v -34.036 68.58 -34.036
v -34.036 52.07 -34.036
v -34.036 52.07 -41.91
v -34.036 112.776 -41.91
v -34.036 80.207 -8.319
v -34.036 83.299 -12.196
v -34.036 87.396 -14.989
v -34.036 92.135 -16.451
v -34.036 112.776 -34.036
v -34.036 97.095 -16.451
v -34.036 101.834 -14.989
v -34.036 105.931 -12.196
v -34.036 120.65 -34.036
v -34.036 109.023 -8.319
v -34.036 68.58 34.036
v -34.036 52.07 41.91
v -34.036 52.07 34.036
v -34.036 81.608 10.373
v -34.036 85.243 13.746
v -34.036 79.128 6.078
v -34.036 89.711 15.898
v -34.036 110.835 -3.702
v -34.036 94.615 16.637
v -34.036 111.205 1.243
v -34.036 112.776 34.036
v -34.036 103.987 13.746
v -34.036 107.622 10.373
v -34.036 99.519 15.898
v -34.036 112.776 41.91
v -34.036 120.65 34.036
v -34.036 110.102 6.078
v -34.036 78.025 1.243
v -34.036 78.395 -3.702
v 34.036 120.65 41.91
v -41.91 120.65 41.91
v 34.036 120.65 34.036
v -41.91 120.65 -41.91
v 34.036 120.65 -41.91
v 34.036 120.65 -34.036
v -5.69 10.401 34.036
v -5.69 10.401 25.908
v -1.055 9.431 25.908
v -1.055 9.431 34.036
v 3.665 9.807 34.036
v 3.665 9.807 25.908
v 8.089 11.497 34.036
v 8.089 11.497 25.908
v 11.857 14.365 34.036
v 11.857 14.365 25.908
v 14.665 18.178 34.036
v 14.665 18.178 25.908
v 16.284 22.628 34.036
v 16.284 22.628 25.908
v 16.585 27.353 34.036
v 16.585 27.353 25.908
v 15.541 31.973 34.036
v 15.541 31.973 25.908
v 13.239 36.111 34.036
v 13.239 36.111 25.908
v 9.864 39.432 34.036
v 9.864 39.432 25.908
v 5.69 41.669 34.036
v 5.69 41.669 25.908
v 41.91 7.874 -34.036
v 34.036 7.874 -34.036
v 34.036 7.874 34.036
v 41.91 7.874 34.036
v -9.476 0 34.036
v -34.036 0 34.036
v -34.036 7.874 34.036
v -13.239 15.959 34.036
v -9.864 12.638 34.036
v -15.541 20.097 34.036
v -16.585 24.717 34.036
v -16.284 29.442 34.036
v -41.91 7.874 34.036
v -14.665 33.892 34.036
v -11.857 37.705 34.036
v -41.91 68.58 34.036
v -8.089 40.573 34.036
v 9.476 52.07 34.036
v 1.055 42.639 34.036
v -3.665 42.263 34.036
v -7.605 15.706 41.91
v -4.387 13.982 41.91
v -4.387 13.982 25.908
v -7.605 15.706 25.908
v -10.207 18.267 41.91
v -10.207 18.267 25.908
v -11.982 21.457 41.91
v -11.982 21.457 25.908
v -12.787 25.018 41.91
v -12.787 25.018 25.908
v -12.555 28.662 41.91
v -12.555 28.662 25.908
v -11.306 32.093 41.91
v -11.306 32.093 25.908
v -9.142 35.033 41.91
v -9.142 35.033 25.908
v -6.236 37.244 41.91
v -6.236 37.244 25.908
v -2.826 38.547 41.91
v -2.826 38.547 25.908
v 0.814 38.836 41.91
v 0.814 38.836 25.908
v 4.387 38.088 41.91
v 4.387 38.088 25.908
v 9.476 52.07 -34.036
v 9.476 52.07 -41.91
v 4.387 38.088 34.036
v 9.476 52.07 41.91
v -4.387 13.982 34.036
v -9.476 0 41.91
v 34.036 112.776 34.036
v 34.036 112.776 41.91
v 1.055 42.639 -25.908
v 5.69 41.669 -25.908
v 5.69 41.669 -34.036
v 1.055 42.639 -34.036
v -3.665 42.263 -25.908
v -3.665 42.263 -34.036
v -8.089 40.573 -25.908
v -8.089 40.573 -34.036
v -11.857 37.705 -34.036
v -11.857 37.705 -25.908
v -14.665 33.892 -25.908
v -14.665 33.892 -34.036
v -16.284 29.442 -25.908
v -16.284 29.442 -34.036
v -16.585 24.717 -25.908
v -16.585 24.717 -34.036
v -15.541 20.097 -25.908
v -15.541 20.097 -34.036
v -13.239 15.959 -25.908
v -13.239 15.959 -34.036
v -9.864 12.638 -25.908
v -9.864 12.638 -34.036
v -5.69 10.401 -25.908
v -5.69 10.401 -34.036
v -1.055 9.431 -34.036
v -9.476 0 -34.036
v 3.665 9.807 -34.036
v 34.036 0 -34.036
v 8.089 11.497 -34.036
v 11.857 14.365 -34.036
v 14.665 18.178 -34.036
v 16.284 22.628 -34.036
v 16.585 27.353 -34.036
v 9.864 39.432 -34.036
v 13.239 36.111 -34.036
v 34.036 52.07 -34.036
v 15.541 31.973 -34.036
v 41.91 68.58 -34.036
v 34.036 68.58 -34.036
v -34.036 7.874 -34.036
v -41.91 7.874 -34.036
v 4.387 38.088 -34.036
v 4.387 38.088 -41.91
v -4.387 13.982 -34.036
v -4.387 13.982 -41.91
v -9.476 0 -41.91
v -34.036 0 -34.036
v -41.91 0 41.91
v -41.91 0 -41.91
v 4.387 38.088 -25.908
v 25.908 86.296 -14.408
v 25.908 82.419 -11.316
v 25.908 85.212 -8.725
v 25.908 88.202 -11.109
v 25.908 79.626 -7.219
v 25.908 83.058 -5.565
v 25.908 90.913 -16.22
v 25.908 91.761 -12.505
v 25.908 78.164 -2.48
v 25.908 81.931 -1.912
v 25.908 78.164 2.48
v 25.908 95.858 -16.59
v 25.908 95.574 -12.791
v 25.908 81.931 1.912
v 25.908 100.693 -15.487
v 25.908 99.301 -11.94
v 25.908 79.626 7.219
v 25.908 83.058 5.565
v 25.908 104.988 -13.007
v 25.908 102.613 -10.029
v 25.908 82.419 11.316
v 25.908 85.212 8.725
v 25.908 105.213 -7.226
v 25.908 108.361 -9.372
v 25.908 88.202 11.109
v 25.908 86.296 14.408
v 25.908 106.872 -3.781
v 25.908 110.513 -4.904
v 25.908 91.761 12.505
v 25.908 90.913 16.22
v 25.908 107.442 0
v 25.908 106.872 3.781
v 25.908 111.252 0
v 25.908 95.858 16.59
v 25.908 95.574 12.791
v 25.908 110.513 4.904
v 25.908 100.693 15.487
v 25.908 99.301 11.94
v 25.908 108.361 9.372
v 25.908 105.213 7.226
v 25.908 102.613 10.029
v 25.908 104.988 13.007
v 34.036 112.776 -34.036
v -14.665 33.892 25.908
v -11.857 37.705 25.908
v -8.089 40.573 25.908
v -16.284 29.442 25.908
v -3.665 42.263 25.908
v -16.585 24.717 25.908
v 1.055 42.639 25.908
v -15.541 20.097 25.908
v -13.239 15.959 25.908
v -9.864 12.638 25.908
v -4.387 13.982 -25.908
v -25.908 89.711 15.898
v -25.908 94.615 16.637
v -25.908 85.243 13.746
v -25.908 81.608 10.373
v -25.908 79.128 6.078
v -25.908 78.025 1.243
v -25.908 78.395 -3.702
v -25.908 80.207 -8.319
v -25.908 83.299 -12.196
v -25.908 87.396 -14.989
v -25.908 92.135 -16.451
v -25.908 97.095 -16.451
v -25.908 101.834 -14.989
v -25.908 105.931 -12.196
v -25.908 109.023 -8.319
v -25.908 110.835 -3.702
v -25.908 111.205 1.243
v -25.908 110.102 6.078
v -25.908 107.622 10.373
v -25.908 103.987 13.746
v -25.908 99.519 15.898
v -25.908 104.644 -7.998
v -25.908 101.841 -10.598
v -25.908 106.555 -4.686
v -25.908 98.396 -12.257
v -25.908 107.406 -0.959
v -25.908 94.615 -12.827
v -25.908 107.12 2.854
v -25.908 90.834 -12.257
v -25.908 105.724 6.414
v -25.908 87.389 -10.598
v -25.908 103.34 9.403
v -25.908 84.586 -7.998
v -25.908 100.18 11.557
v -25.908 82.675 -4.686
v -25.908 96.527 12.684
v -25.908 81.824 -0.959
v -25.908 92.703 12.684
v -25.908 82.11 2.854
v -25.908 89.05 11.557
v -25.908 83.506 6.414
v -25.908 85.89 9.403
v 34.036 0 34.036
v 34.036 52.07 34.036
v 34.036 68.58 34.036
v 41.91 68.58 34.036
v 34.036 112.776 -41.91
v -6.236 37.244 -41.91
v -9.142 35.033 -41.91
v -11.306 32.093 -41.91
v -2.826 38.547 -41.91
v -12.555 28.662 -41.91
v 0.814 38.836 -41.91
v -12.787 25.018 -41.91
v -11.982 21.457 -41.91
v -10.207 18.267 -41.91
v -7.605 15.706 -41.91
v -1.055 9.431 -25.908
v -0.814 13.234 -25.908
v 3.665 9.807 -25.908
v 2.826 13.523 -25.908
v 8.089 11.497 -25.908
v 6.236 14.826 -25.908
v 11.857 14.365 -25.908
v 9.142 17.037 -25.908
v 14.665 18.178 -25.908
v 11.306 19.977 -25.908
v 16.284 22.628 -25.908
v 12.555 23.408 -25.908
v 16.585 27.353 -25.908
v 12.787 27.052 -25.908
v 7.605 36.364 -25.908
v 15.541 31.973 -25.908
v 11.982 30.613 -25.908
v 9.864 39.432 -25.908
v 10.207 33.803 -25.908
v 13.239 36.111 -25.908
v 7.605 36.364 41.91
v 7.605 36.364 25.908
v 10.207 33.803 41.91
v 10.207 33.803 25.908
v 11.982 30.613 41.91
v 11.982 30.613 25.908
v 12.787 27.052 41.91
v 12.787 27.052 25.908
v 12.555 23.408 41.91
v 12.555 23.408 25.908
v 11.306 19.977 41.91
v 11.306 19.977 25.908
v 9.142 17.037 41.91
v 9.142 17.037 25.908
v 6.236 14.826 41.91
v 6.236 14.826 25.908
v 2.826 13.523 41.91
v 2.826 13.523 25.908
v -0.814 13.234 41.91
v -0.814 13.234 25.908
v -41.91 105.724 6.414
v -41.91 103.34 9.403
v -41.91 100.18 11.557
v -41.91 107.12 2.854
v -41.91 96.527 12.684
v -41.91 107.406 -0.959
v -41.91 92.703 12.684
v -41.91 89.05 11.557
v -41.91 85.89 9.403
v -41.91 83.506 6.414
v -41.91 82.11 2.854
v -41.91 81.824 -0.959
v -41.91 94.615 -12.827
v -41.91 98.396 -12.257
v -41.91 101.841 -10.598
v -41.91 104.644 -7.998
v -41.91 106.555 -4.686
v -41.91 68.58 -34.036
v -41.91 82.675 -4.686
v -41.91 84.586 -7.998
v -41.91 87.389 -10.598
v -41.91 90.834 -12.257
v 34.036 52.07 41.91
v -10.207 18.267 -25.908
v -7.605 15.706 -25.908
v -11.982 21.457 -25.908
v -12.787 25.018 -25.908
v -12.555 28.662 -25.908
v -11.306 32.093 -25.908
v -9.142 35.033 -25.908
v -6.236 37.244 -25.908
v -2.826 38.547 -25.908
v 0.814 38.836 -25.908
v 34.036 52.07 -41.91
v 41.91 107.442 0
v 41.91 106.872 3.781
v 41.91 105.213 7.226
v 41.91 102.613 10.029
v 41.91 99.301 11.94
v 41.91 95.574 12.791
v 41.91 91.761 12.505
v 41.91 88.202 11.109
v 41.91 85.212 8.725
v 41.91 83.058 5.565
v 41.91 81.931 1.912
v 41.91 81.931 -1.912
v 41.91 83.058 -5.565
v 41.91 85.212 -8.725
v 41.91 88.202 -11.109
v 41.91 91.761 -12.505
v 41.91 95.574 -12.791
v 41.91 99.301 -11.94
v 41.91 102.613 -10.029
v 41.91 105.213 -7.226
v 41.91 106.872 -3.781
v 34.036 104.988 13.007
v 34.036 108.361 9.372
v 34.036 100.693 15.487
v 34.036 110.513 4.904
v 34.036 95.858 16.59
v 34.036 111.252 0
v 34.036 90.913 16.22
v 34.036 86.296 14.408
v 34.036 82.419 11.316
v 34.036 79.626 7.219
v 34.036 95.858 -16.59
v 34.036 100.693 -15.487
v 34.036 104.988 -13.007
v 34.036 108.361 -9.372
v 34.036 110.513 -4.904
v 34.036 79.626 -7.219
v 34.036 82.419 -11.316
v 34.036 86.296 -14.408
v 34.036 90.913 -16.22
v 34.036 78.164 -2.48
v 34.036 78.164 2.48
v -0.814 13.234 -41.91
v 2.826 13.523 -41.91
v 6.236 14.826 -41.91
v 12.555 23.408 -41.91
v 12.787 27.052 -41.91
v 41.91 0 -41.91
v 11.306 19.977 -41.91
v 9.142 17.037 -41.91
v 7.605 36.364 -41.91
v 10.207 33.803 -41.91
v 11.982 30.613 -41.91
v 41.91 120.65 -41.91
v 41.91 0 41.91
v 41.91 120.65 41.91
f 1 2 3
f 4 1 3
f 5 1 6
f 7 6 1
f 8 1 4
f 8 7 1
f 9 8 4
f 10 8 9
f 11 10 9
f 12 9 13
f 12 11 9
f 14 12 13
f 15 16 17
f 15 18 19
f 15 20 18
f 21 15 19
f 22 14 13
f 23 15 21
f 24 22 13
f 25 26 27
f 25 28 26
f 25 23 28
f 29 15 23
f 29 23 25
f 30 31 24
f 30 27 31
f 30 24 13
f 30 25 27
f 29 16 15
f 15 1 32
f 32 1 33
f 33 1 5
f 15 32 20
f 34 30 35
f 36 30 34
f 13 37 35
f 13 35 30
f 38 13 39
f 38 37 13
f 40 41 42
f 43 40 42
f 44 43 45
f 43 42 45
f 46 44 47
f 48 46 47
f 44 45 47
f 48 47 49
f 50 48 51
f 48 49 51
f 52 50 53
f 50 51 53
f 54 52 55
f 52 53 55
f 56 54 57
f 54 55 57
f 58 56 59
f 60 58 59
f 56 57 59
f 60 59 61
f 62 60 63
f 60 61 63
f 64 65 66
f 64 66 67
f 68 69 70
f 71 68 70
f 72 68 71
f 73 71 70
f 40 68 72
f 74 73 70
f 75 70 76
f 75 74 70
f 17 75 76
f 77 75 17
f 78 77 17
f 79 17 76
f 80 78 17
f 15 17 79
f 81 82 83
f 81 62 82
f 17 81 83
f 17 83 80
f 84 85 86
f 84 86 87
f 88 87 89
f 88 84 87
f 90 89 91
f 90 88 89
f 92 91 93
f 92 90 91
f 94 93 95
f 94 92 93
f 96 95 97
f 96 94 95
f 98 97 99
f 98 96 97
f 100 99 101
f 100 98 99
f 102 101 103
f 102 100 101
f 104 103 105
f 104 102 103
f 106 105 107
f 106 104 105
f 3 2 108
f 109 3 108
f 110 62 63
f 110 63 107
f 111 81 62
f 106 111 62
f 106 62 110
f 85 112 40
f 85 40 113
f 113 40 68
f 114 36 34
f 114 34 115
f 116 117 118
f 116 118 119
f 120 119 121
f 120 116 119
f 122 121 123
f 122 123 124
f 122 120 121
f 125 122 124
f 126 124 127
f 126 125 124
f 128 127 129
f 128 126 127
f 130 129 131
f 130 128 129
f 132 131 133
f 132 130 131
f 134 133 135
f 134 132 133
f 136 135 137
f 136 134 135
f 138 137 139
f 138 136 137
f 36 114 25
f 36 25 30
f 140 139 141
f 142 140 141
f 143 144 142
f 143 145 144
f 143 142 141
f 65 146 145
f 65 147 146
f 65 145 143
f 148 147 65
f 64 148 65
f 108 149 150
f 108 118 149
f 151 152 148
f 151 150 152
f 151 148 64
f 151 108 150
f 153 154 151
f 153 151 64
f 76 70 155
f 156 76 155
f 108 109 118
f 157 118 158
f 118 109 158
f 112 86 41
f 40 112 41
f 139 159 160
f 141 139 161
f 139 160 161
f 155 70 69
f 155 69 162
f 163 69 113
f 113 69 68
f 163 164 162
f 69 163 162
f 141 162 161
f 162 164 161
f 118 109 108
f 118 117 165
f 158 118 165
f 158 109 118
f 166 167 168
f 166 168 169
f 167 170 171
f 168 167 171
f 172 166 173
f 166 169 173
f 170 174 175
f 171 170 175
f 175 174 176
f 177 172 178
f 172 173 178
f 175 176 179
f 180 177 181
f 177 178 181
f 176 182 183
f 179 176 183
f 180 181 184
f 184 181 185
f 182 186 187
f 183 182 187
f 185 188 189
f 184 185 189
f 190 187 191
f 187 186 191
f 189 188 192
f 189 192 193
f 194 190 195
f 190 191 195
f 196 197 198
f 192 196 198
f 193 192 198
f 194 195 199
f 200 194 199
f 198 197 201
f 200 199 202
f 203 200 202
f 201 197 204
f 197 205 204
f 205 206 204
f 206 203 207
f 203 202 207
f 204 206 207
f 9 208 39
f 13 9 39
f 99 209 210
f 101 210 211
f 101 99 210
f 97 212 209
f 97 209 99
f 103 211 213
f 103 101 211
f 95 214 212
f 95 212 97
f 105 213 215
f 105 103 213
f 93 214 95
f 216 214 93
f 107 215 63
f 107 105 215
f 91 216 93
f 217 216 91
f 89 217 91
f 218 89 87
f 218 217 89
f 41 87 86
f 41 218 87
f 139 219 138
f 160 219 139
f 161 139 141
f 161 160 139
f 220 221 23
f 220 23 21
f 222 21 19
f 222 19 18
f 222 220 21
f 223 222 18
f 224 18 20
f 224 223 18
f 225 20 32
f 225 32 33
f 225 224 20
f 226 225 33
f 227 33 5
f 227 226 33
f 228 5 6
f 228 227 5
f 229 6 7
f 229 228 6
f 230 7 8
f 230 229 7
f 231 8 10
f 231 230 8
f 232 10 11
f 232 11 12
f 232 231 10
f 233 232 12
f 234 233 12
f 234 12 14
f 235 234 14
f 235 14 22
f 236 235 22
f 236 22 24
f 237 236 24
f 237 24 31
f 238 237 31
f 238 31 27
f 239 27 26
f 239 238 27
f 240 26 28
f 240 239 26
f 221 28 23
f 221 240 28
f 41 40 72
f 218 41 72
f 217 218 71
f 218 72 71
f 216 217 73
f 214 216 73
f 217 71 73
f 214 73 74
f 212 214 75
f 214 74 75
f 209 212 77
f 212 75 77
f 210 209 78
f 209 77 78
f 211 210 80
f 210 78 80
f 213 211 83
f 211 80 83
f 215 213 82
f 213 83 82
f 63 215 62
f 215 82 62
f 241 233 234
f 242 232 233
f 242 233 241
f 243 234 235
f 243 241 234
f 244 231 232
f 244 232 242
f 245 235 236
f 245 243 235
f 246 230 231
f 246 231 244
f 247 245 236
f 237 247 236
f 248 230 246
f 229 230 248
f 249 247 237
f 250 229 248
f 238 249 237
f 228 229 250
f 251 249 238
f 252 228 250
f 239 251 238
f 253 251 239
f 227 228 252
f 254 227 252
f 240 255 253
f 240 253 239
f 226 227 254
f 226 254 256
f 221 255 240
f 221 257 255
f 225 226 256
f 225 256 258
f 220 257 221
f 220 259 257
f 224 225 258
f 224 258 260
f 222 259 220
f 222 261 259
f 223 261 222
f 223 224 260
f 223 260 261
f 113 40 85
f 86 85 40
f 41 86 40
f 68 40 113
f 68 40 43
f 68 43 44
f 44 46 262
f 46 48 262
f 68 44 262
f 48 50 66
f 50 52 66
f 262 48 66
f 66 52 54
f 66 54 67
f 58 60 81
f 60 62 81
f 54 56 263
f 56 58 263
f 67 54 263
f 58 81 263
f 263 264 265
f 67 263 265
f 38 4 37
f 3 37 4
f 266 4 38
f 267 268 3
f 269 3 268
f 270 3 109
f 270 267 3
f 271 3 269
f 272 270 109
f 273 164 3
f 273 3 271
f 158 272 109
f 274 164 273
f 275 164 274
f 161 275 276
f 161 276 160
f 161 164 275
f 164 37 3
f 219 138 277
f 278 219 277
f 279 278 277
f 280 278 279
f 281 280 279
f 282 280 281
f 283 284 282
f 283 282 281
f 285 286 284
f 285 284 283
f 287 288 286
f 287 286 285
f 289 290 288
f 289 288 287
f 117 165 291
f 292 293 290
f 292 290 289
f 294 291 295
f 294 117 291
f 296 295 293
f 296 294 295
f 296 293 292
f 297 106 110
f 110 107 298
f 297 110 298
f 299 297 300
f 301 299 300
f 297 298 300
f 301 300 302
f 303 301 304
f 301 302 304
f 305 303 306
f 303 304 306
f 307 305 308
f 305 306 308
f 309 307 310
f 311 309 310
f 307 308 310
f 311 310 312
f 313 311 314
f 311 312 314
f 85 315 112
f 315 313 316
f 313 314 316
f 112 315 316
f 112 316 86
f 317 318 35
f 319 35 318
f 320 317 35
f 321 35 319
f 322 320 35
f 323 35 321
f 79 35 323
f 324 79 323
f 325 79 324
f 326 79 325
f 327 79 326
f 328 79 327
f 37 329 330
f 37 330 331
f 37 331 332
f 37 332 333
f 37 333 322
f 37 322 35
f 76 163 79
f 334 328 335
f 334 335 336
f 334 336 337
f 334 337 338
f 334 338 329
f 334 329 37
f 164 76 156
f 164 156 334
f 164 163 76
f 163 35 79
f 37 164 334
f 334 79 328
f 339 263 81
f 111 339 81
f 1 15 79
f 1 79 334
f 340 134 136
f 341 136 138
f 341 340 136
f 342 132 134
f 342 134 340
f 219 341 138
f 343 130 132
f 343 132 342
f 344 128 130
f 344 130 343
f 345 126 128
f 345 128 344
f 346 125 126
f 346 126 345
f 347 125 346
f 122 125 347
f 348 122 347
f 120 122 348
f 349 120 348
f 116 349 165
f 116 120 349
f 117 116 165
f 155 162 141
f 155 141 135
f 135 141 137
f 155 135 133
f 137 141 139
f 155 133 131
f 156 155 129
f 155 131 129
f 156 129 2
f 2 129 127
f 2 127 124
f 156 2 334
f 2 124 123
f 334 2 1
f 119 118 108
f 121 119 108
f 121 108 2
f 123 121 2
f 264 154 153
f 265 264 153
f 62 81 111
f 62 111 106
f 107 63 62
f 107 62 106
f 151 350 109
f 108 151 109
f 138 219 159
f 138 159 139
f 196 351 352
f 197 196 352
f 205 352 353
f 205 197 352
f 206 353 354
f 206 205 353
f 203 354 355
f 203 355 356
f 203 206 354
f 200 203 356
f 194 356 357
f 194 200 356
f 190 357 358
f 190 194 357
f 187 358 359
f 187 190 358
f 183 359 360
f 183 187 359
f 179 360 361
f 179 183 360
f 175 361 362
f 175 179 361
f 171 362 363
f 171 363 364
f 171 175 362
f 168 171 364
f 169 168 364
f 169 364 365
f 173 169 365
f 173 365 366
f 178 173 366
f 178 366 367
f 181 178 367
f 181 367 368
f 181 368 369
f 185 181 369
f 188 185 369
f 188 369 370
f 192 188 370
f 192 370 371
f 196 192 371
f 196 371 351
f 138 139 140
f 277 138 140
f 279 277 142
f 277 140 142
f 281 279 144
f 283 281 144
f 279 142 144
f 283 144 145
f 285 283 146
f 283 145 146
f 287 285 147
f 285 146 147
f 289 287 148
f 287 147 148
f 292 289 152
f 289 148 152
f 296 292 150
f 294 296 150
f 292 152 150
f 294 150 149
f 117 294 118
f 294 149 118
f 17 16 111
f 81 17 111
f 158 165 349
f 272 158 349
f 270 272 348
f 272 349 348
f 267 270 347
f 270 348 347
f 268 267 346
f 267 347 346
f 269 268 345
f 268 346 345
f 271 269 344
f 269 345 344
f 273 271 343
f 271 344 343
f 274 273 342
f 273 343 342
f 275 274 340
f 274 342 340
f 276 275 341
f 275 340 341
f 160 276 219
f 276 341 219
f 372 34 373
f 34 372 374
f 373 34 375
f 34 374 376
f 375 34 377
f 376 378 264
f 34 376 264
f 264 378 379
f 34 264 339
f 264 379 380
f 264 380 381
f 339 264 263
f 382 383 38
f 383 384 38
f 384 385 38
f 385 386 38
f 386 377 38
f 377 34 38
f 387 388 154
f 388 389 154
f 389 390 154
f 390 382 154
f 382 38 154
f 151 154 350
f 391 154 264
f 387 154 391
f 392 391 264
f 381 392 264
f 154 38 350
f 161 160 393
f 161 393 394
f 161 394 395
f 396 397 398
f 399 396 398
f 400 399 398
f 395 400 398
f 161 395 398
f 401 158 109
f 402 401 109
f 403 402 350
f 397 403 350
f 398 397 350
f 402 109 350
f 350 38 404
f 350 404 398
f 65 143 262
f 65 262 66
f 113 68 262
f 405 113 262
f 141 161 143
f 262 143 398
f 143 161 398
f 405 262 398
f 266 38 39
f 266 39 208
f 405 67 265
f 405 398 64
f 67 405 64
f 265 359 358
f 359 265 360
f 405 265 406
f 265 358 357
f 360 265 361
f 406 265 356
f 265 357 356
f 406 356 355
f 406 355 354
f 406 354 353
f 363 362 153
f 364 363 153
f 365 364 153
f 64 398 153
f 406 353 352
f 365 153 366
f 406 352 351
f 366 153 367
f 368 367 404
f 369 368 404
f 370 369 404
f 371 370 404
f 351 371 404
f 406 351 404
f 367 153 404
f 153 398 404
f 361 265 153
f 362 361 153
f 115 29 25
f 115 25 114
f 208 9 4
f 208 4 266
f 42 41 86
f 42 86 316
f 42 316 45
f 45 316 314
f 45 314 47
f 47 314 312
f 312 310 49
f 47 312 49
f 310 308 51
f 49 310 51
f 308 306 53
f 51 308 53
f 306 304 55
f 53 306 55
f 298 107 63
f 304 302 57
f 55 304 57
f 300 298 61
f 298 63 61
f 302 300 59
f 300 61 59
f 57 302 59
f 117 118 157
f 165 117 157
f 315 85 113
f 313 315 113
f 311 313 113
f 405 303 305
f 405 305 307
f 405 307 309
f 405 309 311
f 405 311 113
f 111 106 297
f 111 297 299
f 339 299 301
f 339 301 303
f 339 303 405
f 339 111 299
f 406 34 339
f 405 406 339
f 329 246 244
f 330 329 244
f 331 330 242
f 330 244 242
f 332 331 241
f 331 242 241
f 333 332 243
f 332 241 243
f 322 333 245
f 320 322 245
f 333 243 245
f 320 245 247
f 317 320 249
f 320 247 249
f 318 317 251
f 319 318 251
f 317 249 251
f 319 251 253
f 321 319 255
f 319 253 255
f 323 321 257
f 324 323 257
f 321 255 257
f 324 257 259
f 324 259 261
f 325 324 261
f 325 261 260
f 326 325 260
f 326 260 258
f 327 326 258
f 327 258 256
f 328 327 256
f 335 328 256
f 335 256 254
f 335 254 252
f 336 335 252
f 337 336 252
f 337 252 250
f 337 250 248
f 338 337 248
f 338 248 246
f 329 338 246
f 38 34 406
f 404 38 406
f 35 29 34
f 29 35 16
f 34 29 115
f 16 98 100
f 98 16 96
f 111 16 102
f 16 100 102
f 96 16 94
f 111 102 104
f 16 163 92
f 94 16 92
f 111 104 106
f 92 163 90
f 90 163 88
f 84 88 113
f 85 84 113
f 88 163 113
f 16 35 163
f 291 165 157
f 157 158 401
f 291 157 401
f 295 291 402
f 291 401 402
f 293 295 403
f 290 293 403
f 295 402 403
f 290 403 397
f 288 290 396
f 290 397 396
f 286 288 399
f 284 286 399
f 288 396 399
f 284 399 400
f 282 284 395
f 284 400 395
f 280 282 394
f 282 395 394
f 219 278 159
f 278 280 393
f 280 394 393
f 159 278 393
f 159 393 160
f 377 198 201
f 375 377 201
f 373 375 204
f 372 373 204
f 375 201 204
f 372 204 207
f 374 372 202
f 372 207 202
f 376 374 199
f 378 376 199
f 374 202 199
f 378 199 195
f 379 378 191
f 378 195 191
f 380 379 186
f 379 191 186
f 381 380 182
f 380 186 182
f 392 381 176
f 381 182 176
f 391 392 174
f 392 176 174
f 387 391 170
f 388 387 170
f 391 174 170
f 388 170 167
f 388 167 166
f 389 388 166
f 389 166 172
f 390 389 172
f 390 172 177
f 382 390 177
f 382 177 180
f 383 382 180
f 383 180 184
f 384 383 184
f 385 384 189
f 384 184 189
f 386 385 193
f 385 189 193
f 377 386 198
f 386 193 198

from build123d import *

# Parameters (mm, degrees)
SKETCH2_W                = 83.82
SKETCH2_H                = 83.82
BOSS_EXTRUDE1_DEPTH      = 120.65
SKETCH3_R                = 12.827
CUT_EXTRUDE1_DEPTH       = 153.769967598
SKETCH4_R                = 12.827
CUT_EXTRUDE2_DEPTH       = 153.769967598
SKETCH5_W                = 68.072
SKETCH5_H                = 68.072
CUT_EXTRUDE3_DEPTH       = 135.422165955
SKETCH6_W                = 68.072
SKETCH6_H                = 60.706
CUT_EXTRUDE4_DEPTH       = 153.769967598
SKETCH7_W                = 68.072
SKETCH7_H                = 60.706
CUT_EXTRUDE5_DEPTH       = 153.769967598
BOSS_EXTRUDE6_START      = 8.128
SKETCH18_R               = 16.637
SKETCH18_R_2             = 12.827
BOSS_EXTRUDE6_DEPTH      = 8.128
SKETCH19_R               = 16.637
SKETCH19_R_2             = 12.827
BOSS_EXTRUDE7_DEPTH      = 8.128
SKETCH20_R               = 16.637
SKETCH20_R_2             = 12.827
BOSS_EXTRUDE8_DEPTH      = 8.128
BOSS_EXTRUDE9_START      = 8.128
SKETCH21_R               = 16.637
SKETCH21_R_2             = 12.827
BOSS_EXTRUDE9_DEPTH      = 8.128
INTERSECT1_START         = -41.91
INTERSECT1_DEPTH         = 83.82
INTERSECT1_START_2       = -25.908
INTERSECT1_2_OUTLINE_W   = 8.128
INTERSECT1_2_OUTLINE_H   = 52.07
INTERSECT1_2_DEPTH       = 51.816
INTERSECT1_3_OUTLINE_W   = 7.874
INTERSECT1_3_OUTLINE_H   = 52.07
INTERSECT1_3_OUTLINE_H_2 = 7.874
INTERSECT1_3_DEPTH       = 83.82
INTERSECT1_4_DEPTH       = 7.874
INTERSECT1_START_3       = 34.036
INTERSECT1_5_DEPTH       = 7.874
INTERSECT1_START_4       = -34.036
INTERSECT1_6_DEPTH       = 8.128
INTERSECT1_START_5       = 25.908
INTERSECT1_7_DEPTH       = 8.128
INTERSECT1_8_OUTLINE_R   = 12.827
INTERSECT1_8_DEPTH       = 7.874
INTERSECT1_9_OUTLINE_R   = 16.637
INTERSECT1_9_OUTLINE_R_2 = 12.827
INTERSECT1_9_DEPTH       = 8.128


with BuildPart() as part:
    # Sketch2 → Boss-Extrude1 (new body)
    with BuildSketch(Plane(origin=(0, 0, 0), x_dir=(1, 0, 0), z_dir=(0, 1, 0))):
        Rectangle(SKETCH2_W, SKETCH2_H)
    extrude(amount=BOSS_EXTRUDE1_DEPTH)

    # Sketch3 → Cut-Extrude1 (cut, through all)
    with BuildSketch(Plane.XY.offset(41.91)):
        with Locations((0, 26.035)):
            Circle(SKETCH3_R)
    extrude(amount=-CUT_EXTRUDE1_DEPTH, mode=Mode.SUBTRACT)

    # Sketch4 → Cut-Extrude2 (cut, through all)
    with BuildSketch(Plane(origin=(41.91, 0, 0), x_dir=(0, 0, -1), z_dir=(1, 0, 0))):
        with Locations((0, 94.615)):
            Circle(SKETCH4_R)
    extrude(amount=-CUT_EXTRUDE2_DEPTH, mode=Mode.SUBTRACT)

    # Sketch5 → Cut-Extrude3 (cut, through all)
    with BuildSketch(Plane(origin=(0, 120.65, 0), x_dir=(1, 0, 0), z_dir=(0, 1, 0))):
        Rectangle(SKETCH5_W, SKETCH5_H)
    extrude(amount=-CUT_EXTRUDE3_DEPTH, mode=Mode.SUBTRACT)

    # Sketch6 → Cut-Extrude4 (cut, through all)
    with BuildSketch(Plane(origin=(41.91, 0, 0), x_dir=(0, 0, -1), z_dir=(1, 0, 0))):
        with Locations((0, 38.227)):
            Rectangle(SKETCH6_W, SKETCH6_H)
    extrude(amount=-CUT_EXTRUDE4_DEPTH, mode=Mode.SUBTRACT)

    # Sketch7 → Cut-Extrude5 (cut, through all)
    with BuildSketch(Plane.XY.offset(41.91)):
        with Locations((0, 82.423)):
            Rectangle(SKETCH7_W, SKETCH7_H)
    extrude(amount=-CUT_EXTRUDE5_DEPTH, mode=Mode.SUBTRACT)

    # Sketch18 → Boss-Extrude6 (add)
    with BuildSketch(Plane(origin=(-34.036, 0, 0), x_dir=(0, 0, -1), z_dir=(1, 0, 0)).offset(BOSS_EXTRUDE6_START)):
        with Locations(Location((0, 94.615, 0), (0, 0, 180))):
            Circle(SKETCH18_R)
        with Locations((0, 94.615)):
            Circle(SKETCH18_R_2, mode=Mode.SUBTRACT)
    extrude(amount=-BOSS_EXTRUDE6_DEPTH)

    # Sketch19 → Boss-Extrude7 (add)
    with BuildSketch(Plane.ZY.offset(-34.036)):
        with Locations((0, 94.615)):
            Circle(SKETCH19_R)
        with Locations(Location((0, 94.615, 0), (0, 0, 180))):
            Circle(SKETCH19_R_2, mode=Mode.SUBTRACT)
    extrude(amount=BOSS_EXTRUDE7_DEPTH)

    # Sketch20 → Boss-Extrude8 (add)
    with BuildSketch(Plane(origin=(0, 0, 34.036), x_dir=(-1, 0, 0), z_dir=(0, 0, -1))):
        with Locations(Location((0, 26.035, 0), (0, 0, 180))):
            Circle(SKETCH20_R)
        with Locations(Location((0, 26.035, 0), (0, 0, 180))):
            Circle(SKETCH20_R_2, mode=Mode.SUBTRACT)
    extrude(amount=BOSS_EXTRUDE8_DEPTH)

    # Sketch21 → Boss-Extrude9 (add)
    with BuildSketch(Plane.XY.offset(-34.036).offset(BOSS_EXTRUDE9_START)):
        with Locations((0, 26.035)):
            Circle(SKETCH21_R)
        with Locations((0, 26.035)):
            Circle(SKETCH21_R_2, mode=Mode.SUBTRACT)
    extrude(amount=-BOSS_EXTRUDE9_DEPTH)

    # Intersect1: read off the stored shape, not the designer's step
    # Intersect1 outline → Intersect1 (cut)
    with BuildSketch(Plane.XY.offset(INTERSECT1_START)):
        with BuildLine():
            Line((41.91, 120.65), (34.036, 120.65))
            Line((34.036, 120.65), (34.036, 52.07))
            Line((34.036, 52.07), (9.475965049, 52.07))
            Line((9.475965049, 52.07), (4.387092378, 38.088437247))
            ThreePointArc((4.387092378, 38.088437247), (12.053437247, 21.647907622), (-4.387092378, 13.981562753))
            Line((-4.387092378, 13.981562753), (-9.475965049, 0))
            Line((-9.475965049, 0), (41.91, 0))
            Line((41.91, 0), (41.91, 120.65))
        make_face()
    extrude(amount=INTERSECT1_DEPTH, mode=Mode.SUBTRACT)

    # Intersect1 2 outline → Intersect1 2 (cut)
    with BuildSketch(Plane.XY.offset(INTERSECT1_START_2)):
        with Locations((29.972, 94.615)):
            Rectangle(INTERSECT1_2_OUTLINE_W, INTERSECT1_2_OUTLINE_H)
    extrude(amount=INTERSECT1_2_DEPTH, mode=Mode.SUBTRACT)


with BuildPart() as body_2:
    # Intersect1 3 outline → Intersect1 3 (new body)
    with BuildSketch(Plane.XY.offset(INTERSECT1_START)):
        with Locations((37.973, 94.615)):
            Rectangle(INTERSECT1_3_OUTLINE_W, INTERSECT1_3_OUTLINE_H)
        with Locations((37.973, 3.937)):
            Rectangle(INTERSECT1_3_OUTLINE_W, INTERSECT1_3_OUTLINE_H_2)
    extrude(amount=INTERSECT1_3_DEPTH)

    # Intersect1 4 outline → Intersect1 4 (add)
    with BuildSketch(Plane.XY.offset(INTERSECT1_START)):
        with BuildLine():
            ThreePointArc((4.387092378, 38.088437247), (12.053437247, 21.647907622), (-4.387092378, 13.981562753))
            Line((-4.387092378, 13.981562753), (-9.475965049, 0))
            Line((-9.475965049, 0), (34.036, 0))
            Line((34.036, 0), (34.036, 7.874))
            Line((34.036, 7.874), (41.91, 7.874))
            Line((41.91, 7.874), (41.91, 68.58))
            Line((41.91, 68.58), (34.036, 68.58))
            Line((34.036, 68.58), (34.036, 52.07))
            Line((34.036, 52.07), (9.475965049, 52.07))
            Line((9.475965049, 52.07), (4.387092378, 38.088437247))
        make_face()
    extrude(amount=INTERSECT1_4_DEPTH)

    # Intersect1 5 outline → Intersect1 5 (add)
    with BuildSketch(Plane.XY.offset(INTERSECT1_START_3)):
        with BuildLine():
            ThreePointArc((4.387092378, 38.088437247), (12.053437247, 21.647907622), (-4.387092378, 13.981562753))
            Line((-4.387092378, 13.981562753), (-9.475965049, 0))
            Line((-9.475965049, 0), (34.036, 0))
            Line((34.036, 0), (34.036, 7.874))
            Line((34.036, 7.874), (41.91, 7.874))
            Line((41.91, 7.874), (41.91, 68.58))
            Line((41.91, 68.58), (34.036, 68.58))
            Line((34.036, 68.58), (34.036, 52.07))
            Line((34.036, 52.07), (9.475965049, 52.07))
            Line((9.475965049, 52.07), (4.387092378, 38.088437247))
        make_face()
    extrude(amount=INTERSECT1_5_DEPTH)

    # Intersect1 6 outline → Intersect1 6 (add)
    with BuildSketch(Plane.XY.offset(INTERSECT1_START_4)):
        with BuildLine():
            Line((5.690189125, 41.668666132), (4.387092378, 38.088437247))
            ThreePointArc((4.387092378, 38.088437247), (12.053437247, 21.647907622), (-4.387092378, 13.981562753))
            Line((-4.387092378, 13.981562753), (-5.690189125, 10.401333868))
            ThreePointArc((-5.690189125, 10.401333868), (15.633666132, 20.344810875), (5.690189125, 41.668666132))
        make_face()
    extrude(amount=INTERSECT1_6_DEPTH)

    # Intersect1 7 outline → Intersect1 7 (add)
    with BuildSketch(Plane.XY.offset(INTERSECT1_START_5)):
        with BuildLine():
            Line((5.690189125, 41.668666132), (4.387092378, 38.088437247))
            ThreePointArc((4.387092378, 38.088437247), (12.053437247, 21.647907622), (-4.387092378, 13.981562753))
            Line((-4.387092378, 13.981562753), (-5.690189125, 10.401333868))
            ThreePointArc((-5.690189125, 10.401333868), (15.633666132, 20.344810875), (5.690189125, 41.668666132))
        make_face()
    extrude(amount=INTERSECT1_7_DEPTH)

    # Intersect1 8 outline → Intersect1 8 (cut)
    with BuildSketch(Plane.YZ.offset(INTERSECT1_START_3)):
        with Locations((94.615, 0)):
            Circle(INTERSECT1_8_OUTLINE_R)
    extrude(amount=INTERSECT1_8_DEPTH, mode=Mode.SUBTRACT)

    # Intersect1 9 outline → Intersect1 9 (add)
    with BuildSketch(Plane.YZ.offset(INTERSECT1_START_5)):
        with Locations((94.615, 0)):
            Circle(INTERSECT1_9_OUTLINE_R)
        with Locations((94.615, 0)):
            Circle(INTERSECT1_9_OUTLINE_R_2, mode=Mode.SUBTRACT)
    extrude(amount=INTERSECT1_9_DEPTH)


solid = Compound([part.part, body_2.part])
